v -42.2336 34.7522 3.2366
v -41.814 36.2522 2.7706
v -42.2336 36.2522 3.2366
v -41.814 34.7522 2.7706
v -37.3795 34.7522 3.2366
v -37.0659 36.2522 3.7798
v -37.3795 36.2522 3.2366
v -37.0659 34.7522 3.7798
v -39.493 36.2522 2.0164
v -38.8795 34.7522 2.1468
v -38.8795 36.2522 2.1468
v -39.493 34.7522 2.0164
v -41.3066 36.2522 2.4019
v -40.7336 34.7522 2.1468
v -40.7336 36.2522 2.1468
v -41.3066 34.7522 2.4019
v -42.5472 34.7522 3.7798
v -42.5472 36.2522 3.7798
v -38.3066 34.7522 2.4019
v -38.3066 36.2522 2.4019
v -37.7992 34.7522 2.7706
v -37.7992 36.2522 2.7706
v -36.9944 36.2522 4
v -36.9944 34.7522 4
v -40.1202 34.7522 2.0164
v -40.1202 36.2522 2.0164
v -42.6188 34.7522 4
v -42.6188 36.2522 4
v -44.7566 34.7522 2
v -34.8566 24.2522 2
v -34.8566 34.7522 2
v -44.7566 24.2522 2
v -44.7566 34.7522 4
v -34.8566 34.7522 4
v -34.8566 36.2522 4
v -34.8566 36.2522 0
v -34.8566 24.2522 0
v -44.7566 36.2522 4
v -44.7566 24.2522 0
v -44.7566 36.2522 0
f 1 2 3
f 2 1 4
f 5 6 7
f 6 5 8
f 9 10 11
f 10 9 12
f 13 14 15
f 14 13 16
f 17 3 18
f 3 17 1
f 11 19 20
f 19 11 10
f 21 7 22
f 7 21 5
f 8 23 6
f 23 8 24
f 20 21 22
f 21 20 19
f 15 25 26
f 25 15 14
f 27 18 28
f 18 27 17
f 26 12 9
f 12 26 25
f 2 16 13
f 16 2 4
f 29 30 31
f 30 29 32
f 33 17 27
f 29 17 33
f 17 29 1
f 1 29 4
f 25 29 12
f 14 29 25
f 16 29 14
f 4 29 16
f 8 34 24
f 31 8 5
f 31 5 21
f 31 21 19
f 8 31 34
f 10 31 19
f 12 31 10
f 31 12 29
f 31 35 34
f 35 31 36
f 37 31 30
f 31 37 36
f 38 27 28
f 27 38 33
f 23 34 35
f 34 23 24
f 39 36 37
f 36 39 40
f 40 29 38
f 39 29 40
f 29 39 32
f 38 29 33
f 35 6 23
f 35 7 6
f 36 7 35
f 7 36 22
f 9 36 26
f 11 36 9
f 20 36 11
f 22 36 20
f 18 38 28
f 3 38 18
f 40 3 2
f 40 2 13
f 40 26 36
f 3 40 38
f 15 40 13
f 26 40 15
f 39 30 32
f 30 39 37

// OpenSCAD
difference () {
  union () {
    translate ([-39.80658416442557, 30.25216777661145, 2]) {
      cube ([9.9, 12, 4], center=true);
    }
  }
  union () {
    translate ([-39.80658416442557, 36.25216777661145, 5]) {
      rotate (a=90.0, v=[1, 0, 0]) {
        cylinder ($fn=30, h=20, r=3, center=true);
      }
    }
    translate ([-39.80658416442557, 29.25216777661145, 11/2]) {
      cube ([11, 11, 7], center=true);
    }
  }
}
